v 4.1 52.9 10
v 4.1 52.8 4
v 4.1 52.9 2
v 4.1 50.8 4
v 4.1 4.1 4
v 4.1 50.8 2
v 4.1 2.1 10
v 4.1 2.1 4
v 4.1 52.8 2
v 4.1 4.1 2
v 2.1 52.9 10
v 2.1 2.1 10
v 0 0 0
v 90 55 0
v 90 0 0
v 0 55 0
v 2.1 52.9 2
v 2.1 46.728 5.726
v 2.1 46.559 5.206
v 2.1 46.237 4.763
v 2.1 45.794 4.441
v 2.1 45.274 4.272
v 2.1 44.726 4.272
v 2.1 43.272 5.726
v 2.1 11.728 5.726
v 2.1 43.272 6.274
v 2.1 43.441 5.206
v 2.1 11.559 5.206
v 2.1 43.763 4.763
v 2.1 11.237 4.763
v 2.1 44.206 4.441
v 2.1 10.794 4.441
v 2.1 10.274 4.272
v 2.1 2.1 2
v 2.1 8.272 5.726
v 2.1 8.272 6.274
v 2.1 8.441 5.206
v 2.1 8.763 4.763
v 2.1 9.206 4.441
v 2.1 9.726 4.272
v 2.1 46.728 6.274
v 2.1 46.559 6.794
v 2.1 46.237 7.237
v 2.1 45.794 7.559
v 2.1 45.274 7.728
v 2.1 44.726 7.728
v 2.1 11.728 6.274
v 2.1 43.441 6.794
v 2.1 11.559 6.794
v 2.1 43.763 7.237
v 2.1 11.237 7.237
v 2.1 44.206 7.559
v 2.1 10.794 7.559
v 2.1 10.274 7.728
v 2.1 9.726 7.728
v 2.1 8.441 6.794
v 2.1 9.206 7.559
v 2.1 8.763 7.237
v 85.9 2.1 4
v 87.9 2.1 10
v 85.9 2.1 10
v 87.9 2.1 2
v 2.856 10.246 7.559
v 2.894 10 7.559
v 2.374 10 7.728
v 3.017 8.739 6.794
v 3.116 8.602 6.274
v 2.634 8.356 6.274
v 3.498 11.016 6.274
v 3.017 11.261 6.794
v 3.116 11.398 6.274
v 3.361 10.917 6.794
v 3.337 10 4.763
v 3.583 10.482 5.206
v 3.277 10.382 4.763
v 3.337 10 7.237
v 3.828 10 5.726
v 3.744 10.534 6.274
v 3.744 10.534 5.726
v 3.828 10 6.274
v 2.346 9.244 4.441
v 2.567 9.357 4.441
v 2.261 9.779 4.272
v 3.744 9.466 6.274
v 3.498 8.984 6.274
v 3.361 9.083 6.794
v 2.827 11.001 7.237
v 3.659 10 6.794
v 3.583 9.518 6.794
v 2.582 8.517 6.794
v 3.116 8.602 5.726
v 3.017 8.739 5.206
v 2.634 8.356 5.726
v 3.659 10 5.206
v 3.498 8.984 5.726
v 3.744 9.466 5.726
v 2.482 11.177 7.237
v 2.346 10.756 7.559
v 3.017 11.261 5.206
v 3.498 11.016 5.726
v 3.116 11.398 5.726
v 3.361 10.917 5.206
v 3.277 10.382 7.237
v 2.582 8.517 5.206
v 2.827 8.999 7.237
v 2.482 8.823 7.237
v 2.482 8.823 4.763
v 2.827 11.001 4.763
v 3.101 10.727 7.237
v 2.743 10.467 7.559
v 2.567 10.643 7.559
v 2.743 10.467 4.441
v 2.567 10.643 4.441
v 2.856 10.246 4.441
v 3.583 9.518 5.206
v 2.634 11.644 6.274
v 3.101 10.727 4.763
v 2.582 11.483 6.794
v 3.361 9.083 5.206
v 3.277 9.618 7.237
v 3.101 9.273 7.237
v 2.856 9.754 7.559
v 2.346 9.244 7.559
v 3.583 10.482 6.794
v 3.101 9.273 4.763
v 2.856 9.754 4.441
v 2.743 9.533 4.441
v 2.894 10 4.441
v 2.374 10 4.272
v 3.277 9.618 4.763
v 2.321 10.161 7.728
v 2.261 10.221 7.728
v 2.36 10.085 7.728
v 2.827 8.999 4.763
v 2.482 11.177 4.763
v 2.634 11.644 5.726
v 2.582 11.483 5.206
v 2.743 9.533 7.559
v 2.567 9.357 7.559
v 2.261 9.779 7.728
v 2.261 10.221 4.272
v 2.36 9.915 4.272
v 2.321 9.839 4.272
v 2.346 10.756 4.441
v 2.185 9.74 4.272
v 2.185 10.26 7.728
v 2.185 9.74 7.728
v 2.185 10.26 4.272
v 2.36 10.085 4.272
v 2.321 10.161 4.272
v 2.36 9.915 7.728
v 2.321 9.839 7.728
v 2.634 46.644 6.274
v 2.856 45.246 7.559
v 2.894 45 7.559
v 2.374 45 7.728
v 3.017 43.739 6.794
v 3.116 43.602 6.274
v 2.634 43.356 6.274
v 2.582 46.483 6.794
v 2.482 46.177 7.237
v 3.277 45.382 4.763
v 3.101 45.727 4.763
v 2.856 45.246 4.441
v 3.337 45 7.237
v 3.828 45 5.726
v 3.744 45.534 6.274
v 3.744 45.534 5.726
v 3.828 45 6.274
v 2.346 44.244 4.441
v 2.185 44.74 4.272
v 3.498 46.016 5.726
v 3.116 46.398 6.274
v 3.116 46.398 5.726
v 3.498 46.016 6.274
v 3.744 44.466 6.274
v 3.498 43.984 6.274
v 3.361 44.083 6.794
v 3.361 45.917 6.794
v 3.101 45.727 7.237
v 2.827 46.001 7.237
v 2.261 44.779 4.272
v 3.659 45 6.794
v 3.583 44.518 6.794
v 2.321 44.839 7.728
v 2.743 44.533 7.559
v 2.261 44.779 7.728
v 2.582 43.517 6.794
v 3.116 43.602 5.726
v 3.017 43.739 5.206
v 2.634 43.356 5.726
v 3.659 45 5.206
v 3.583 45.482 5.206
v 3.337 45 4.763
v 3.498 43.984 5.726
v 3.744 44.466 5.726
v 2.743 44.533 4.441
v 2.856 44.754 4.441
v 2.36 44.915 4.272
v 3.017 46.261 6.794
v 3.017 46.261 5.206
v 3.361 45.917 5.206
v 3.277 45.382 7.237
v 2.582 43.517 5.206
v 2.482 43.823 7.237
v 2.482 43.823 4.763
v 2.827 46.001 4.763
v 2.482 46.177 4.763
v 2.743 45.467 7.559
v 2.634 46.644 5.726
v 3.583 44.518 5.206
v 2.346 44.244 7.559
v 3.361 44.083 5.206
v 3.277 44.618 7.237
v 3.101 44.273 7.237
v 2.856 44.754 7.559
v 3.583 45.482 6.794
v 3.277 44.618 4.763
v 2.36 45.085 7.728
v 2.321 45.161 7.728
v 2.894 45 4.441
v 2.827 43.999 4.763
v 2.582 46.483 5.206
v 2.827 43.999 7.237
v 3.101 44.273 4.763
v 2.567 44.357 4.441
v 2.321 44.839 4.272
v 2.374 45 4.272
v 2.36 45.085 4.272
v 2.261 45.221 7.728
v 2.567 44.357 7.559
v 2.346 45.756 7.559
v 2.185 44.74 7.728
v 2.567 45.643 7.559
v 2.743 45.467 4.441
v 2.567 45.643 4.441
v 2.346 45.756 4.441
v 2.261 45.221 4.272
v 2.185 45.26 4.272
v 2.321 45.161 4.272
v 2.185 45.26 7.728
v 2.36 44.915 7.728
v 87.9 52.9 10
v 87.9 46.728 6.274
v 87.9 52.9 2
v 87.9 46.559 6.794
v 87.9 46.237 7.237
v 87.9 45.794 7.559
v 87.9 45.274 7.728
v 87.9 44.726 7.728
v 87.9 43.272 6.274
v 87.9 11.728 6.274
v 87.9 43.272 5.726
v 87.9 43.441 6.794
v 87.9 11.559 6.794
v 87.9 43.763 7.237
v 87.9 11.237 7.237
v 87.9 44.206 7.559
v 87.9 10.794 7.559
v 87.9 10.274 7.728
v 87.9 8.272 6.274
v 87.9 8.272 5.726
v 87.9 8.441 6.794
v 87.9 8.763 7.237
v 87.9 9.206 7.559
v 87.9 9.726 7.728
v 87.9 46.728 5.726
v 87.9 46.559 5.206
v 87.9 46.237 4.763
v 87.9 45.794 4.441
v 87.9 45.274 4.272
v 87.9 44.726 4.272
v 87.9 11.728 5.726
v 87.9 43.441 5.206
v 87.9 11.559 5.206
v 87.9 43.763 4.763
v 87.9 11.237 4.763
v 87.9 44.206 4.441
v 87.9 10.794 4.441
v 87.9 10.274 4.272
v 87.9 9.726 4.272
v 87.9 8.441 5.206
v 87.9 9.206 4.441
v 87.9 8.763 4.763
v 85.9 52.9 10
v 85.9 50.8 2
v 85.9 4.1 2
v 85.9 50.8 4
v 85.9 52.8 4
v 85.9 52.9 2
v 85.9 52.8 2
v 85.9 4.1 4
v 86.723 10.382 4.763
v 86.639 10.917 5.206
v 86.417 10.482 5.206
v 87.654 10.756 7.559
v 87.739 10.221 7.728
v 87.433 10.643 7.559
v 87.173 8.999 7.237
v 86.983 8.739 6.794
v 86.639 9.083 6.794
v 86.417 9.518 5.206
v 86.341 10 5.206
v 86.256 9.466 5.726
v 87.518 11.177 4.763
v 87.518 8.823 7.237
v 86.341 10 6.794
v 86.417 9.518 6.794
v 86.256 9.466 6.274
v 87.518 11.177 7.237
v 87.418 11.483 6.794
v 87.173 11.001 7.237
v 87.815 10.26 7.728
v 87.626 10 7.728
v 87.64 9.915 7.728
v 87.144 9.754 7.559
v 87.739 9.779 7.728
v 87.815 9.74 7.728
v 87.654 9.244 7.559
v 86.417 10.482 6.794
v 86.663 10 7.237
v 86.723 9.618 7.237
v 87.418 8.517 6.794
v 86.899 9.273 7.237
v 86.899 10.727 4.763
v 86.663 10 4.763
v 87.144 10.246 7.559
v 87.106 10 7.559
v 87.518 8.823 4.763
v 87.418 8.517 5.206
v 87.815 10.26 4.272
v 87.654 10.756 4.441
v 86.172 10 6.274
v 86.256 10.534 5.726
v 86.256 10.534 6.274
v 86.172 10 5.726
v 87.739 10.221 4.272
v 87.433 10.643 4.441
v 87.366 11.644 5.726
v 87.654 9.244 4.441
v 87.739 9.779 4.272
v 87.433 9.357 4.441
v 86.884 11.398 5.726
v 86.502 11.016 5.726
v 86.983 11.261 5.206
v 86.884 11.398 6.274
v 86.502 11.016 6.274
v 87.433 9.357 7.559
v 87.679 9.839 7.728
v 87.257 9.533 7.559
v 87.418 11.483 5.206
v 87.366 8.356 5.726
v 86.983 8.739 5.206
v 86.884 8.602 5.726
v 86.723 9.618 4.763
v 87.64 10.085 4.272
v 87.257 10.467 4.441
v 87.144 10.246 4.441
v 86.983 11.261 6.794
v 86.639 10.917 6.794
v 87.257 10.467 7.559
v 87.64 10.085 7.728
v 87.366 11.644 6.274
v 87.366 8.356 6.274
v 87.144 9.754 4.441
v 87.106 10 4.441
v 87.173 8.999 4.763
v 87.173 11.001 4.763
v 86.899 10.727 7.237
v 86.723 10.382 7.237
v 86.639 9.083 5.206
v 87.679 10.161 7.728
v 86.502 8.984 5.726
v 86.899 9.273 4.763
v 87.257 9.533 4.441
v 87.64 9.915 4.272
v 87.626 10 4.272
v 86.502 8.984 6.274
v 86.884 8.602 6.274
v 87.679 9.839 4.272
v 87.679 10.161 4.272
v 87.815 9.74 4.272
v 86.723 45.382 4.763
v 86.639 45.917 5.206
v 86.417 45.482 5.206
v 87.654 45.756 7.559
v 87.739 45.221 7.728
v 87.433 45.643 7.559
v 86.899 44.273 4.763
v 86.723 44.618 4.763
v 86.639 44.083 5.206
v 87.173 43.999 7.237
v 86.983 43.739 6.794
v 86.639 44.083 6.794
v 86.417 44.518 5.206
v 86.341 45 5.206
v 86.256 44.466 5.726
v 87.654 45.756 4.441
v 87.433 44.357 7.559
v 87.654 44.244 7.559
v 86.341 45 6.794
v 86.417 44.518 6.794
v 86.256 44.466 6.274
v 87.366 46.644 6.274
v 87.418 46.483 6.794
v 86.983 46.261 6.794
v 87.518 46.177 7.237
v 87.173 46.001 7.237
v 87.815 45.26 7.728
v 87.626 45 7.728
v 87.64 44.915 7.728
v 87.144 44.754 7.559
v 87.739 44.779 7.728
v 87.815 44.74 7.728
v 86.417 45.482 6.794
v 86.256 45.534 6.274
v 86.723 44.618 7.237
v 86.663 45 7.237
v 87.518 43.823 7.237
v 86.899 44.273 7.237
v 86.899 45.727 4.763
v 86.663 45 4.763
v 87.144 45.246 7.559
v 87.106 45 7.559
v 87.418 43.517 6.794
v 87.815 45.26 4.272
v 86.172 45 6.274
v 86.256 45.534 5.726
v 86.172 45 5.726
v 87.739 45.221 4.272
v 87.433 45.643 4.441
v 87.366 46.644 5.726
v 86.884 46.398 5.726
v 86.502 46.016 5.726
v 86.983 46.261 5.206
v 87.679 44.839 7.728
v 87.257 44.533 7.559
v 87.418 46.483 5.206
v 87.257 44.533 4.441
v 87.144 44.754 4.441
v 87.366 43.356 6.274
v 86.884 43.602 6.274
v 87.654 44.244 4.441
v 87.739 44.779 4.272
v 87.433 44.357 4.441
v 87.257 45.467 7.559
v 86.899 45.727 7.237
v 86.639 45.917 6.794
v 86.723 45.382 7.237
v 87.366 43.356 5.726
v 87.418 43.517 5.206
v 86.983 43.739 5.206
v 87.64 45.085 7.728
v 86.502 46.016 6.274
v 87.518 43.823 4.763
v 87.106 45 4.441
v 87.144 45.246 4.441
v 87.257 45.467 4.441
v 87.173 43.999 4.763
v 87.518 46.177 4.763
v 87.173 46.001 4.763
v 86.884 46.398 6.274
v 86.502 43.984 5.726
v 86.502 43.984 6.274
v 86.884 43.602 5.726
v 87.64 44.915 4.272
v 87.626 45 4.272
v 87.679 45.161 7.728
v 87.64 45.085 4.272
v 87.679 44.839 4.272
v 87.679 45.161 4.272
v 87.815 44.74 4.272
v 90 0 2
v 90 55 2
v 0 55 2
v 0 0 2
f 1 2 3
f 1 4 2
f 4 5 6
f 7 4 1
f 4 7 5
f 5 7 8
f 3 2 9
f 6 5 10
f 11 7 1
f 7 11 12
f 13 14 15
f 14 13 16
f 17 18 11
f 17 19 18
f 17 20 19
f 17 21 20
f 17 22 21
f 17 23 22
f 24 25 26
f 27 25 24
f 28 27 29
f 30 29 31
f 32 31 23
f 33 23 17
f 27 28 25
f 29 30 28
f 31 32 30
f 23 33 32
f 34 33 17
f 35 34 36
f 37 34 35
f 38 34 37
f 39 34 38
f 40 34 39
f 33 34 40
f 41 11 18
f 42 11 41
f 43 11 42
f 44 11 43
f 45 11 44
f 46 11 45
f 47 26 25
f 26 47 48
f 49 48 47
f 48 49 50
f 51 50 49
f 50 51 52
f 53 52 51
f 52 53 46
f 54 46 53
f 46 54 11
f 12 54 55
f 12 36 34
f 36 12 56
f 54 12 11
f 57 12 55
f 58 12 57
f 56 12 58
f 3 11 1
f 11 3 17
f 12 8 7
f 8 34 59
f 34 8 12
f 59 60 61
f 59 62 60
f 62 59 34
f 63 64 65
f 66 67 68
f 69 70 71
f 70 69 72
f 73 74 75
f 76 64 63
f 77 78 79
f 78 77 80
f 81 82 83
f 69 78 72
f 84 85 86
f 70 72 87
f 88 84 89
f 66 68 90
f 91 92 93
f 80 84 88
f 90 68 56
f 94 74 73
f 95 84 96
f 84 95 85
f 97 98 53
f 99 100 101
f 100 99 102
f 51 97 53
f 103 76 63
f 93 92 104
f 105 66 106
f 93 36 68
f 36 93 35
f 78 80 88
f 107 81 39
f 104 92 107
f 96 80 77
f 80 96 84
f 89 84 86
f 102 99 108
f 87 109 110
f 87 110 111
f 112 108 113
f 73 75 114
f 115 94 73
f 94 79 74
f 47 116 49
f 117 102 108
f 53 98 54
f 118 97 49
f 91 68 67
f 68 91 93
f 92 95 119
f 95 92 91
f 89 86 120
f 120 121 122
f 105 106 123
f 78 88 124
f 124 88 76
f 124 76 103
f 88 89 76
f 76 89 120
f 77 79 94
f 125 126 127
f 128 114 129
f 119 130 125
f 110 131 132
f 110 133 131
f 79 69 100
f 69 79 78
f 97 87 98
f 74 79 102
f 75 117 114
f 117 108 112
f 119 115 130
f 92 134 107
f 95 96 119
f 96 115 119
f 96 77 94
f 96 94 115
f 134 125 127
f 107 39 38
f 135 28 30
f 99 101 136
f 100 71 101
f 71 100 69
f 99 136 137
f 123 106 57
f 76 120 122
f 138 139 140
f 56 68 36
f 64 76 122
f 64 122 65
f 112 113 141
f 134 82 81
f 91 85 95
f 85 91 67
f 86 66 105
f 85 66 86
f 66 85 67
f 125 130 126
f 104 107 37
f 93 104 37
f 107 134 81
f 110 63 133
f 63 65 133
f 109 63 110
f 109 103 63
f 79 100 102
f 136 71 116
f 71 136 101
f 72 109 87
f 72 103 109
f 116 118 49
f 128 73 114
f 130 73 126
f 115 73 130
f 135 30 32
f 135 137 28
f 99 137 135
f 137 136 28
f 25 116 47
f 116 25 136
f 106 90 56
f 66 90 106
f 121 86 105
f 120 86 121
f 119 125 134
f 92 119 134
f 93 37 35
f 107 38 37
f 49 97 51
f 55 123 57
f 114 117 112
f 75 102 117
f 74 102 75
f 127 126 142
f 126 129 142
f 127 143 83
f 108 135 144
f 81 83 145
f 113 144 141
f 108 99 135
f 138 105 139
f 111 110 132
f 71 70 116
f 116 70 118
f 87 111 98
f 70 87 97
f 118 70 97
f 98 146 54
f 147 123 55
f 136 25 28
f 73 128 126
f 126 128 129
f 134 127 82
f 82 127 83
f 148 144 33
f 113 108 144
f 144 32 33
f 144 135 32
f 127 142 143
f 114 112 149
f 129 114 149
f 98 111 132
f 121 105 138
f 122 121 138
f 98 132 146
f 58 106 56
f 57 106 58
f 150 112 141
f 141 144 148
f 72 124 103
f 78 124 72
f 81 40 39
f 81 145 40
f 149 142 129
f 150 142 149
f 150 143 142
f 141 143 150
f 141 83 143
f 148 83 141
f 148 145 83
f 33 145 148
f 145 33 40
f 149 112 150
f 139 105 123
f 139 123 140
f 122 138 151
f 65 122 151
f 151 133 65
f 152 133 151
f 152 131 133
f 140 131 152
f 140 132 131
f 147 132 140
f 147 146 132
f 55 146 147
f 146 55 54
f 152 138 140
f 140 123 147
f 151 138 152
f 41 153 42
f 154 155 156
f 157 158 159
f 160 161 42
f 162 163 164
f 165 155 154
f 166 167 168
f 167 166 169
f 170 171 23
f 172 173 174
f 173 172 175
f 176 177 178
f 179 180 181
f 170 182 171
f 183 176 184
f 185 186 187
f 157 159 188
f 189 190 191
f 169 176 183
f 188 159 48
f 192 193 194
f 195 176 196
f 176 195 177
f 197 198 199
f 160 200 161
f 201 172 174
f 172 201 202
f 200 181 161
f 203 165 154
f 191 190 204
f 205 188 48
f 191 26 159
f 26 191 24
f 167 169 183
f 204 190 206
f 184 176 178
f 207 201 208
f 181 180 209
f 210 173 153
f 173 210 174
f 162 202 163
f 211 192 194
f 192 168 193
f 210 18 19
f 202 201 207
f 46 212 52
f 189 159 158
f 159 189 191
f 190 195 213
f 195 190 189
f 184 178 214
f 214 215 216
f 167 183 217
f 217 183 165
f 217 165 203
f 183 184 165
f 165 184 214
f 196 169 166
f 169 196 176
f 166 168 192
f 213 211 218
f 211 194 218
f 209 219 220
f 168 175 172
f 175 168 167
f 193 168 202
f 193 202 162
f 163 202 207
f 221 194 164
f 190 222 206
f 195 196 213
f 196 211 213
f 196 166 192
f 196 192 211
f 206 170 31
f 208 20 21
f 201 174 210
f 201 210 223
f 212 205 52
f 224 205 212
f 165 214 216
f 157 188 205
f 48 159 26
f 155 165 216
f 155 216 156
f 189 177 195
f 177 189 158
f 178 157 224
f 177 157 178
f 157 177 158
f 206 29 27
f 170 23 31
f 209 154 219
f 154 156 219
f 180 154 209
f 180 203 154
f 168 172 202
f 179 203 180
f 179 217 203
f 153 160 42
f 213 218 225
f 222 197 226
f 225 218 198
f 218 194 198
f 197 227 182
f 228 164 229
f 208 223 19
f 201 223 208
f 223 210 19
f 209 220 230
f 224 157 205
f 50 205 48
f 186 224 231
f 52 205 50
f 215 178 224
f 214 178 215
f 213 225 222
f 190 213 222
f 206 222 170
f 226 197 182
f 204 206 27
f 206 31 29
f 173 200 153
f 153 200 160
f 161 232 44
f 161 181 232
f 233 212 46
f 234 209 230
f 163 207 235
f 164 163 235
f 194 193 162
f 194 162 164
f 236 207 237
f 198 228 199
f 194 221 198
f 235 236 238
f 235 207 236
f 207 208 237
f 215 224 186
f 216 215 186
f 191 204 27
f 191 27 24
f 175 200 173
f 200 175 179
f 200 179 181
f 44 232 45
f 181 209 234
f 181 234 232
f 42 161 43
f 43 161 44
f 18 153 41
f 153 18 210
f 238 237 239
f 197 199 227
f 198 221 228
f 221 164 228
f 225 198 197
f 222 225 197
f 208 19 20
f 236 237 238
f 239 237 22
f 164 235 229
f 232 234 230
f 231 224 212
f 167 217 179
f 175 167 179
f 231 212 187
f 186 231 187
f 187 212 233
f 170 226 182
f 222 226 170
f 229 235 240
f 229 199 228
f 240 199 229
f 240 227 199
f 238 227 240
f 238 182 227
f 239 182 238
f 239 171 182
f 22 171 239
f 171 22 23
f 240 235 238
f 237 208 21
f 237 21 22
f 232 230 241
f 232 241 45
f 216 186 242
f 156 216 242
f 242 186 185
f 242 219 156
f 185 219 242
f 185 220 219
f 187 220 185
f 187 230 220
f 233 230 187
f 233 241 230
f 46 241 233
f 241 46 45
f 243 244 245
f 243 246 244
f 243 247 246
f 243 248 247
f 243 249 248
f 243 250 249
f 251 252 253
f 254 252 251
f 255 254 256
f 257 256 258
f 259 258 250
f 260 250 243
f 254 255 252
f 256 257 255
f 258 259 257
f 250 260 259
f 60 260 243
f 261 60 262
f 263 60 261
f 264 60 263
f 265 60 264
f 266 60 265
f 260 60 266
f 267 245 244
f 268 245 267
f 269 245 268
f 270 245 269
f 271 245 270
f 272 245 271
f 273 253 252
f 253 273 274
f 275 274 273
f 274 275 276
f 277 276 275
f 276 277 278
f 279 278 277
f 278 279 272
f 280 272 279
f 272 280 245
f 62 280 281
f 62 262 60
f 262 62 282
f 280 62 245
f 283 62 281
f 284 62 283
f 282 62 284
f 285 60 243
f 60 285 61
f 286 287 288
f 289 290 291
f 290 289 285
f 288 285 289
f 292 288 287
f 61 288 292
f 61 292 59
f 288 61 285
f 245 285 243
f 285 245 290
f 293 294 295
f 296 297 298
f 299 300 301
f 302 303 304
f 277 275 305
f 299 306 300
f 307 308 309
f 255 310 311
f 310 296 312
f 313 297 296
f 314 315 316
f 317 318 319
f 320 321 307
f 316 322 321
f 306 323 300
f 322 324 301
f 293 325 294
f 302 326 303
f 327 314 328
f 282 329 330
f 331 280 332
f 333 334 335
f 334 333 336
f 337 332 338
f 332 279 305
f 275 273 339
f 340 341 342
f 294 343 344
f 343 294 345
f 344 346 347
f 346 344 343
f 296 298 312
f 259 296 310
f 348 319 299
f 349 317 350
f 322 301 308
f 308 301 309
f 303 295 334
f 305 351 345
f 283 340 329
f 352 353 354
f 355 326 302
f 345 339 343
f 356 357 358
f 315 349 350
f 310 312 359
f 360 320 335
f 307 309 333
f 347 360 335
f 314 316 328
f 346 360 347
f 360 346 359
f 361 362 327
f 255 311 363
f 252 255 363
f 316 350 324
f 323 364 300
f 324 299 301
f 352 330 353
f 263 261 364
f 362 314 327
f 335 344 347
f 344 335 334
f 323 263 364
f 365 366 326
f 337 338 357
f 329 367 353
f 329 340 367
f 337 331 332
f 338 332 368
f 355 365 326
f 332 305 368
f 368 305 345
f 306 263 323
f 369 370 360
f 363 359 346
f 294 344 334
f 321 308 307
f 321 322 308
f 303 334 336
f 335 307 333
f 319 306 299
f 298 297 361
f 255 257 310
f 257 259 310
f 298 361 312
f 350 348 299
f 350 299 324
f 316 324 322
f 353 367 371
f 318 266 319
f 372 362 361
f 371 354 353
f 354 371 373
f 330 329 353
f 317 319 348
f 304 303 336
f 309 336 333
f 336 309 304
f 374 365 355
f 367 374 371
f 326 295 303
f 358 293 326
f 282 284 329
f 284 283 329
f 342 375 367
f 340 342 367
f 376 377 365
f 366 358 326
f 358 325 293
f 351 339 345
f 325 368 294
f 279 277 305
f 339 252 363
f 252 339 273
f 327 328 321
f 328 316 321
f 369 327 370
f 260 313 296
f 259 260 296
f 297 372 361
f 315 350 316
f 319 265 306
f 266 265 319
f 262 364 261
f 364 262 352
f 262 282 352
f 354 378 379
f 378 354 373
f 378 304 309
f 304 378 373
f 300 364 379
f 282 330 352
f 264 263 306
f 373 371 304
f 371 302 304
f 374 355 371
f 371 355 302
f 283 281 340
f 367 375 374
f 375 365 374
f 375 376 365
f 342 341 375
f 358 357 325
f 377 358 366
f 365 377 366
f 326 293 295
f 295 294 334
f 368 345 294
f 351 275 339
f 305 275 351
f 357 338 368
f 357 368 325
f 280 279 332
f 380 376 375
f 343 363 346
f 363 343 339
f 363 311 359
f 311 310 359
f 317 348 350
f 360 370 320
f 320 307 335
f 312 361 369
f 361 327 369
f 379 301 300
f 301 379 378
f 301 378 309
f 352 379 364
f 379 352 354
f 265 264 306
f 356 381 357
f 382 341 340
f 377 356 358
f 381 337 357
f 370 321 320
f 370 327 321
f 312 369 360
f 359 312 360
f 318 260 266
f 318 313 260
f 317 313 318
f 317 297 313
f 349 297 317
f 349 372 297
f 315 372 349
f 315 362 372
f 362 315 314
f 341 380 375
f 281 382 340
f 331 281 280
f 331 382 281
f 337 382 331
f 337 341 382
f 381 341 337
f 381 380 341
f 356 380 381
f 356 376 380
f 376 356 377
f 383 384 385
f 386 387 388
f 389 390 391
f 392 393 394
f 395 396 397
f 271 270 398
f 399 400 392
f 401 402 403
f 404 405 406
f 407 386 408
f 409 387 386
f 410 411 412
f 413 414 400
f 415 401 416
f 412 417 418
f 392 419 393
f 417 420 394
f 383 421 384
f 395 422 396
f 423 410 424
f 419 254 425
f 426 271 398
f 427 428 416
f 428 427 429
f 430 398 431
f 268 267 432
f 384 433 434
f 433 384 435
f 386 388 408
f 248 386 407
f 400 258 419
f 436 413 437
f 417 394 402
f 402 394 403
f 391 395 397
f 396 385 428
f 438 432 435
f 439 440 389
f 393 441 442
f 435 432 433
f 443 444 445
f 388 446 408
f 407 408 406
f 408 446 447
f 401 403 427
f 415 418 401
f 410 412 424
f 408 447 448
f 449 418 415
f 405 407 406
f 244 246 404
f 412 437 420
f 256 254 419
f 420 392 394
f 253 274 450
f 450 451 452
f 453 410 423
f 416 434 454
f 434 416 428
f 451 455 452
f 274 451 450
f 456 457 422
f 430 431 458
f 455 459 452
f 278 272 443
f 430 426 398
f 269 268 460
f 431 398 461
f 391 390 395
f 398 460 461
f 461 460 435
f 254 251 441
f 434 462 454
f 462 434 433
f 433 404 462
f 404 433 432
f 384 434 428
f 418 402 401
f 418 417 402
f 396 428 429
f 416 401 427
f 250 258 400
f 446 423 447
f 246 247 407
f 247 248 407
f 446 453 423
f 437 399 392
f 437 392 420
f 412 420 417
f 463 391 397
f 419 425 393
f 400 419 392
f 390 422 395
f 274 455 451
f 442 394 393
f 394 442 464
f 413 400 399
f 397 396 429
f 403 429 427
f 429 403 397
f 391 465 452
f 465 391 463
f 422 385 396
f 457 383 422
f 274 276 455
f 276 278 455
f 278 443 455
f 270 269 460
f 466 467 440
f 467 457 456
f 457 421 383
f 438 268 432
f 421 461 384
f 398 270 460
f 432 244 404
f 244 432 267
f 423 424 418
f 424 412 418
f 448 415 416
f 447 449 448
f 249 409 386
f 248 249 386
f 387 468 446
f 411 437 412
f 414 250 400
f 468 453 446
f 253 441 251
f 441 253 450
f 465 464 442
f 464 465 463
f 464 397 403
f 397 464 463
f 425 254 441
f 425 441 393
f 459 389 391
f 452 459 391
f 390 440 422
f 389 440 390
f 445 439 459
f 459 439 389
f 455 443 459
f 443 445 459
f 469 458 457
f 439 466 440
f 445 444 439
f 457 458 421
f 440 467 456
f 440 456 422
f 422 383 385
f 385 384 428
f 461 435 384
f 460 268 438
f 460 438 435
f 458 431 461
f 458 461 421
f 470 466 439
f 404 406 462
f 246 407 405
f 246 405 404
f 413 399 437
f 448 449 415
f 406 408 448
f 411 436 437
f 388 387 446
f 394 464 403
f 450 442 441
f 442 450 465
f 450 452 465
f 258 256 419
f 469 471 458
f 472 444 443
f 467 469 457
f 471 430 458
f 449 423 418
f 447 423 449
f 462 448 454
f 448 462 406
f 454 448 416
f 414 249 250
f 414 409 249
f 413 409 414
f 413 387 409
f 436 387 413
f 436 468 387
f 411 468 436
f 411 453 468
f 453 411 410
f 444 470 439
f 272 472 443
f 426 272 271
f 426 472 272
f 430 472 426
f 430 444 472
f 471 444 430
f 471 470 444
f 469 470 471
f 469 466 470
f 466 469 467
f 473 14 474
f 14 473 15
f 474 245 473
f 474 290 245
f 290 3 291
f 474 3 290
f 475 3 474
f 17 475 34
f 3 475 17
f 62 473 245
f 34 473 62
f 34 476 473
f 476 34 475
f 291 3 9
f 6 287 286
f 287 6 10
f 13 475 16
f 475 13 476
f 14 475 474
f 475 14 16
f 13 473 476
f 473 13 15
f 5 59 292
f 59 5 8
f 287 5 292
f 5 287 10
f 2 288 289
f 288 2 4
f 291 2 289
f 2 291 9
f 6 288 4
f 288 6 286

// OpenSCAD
// Startpoint Router ground:

le=90;
br=55;
hr=25;
$fn=20;

union(){
    translate ([0,0,0])cube([le, br,2]);
    translate ([2.1,2.1,0])cube([le-4.2, 2,4]);
    translate ([2.1,br-4.2,0])cube([le-4.2, 2,4]);

    difference() {
         translate ([2.1,2.1,0])cube([2, br-4.2,10]);
         translate ([2.1,10,6])sphere (d=3.5);
         translate ([2.1,br-10,6])sphere (d=3.5);
    }
    difference() {
         translate ([le-2-2.1,2.1,0])cube([2, br-4.2,10]);
         translate ([le-2.1,10,6])sphere (d=3.5);
         translate ([le-2.1,br-10,6])sphere (d=3.5);
    }
}
